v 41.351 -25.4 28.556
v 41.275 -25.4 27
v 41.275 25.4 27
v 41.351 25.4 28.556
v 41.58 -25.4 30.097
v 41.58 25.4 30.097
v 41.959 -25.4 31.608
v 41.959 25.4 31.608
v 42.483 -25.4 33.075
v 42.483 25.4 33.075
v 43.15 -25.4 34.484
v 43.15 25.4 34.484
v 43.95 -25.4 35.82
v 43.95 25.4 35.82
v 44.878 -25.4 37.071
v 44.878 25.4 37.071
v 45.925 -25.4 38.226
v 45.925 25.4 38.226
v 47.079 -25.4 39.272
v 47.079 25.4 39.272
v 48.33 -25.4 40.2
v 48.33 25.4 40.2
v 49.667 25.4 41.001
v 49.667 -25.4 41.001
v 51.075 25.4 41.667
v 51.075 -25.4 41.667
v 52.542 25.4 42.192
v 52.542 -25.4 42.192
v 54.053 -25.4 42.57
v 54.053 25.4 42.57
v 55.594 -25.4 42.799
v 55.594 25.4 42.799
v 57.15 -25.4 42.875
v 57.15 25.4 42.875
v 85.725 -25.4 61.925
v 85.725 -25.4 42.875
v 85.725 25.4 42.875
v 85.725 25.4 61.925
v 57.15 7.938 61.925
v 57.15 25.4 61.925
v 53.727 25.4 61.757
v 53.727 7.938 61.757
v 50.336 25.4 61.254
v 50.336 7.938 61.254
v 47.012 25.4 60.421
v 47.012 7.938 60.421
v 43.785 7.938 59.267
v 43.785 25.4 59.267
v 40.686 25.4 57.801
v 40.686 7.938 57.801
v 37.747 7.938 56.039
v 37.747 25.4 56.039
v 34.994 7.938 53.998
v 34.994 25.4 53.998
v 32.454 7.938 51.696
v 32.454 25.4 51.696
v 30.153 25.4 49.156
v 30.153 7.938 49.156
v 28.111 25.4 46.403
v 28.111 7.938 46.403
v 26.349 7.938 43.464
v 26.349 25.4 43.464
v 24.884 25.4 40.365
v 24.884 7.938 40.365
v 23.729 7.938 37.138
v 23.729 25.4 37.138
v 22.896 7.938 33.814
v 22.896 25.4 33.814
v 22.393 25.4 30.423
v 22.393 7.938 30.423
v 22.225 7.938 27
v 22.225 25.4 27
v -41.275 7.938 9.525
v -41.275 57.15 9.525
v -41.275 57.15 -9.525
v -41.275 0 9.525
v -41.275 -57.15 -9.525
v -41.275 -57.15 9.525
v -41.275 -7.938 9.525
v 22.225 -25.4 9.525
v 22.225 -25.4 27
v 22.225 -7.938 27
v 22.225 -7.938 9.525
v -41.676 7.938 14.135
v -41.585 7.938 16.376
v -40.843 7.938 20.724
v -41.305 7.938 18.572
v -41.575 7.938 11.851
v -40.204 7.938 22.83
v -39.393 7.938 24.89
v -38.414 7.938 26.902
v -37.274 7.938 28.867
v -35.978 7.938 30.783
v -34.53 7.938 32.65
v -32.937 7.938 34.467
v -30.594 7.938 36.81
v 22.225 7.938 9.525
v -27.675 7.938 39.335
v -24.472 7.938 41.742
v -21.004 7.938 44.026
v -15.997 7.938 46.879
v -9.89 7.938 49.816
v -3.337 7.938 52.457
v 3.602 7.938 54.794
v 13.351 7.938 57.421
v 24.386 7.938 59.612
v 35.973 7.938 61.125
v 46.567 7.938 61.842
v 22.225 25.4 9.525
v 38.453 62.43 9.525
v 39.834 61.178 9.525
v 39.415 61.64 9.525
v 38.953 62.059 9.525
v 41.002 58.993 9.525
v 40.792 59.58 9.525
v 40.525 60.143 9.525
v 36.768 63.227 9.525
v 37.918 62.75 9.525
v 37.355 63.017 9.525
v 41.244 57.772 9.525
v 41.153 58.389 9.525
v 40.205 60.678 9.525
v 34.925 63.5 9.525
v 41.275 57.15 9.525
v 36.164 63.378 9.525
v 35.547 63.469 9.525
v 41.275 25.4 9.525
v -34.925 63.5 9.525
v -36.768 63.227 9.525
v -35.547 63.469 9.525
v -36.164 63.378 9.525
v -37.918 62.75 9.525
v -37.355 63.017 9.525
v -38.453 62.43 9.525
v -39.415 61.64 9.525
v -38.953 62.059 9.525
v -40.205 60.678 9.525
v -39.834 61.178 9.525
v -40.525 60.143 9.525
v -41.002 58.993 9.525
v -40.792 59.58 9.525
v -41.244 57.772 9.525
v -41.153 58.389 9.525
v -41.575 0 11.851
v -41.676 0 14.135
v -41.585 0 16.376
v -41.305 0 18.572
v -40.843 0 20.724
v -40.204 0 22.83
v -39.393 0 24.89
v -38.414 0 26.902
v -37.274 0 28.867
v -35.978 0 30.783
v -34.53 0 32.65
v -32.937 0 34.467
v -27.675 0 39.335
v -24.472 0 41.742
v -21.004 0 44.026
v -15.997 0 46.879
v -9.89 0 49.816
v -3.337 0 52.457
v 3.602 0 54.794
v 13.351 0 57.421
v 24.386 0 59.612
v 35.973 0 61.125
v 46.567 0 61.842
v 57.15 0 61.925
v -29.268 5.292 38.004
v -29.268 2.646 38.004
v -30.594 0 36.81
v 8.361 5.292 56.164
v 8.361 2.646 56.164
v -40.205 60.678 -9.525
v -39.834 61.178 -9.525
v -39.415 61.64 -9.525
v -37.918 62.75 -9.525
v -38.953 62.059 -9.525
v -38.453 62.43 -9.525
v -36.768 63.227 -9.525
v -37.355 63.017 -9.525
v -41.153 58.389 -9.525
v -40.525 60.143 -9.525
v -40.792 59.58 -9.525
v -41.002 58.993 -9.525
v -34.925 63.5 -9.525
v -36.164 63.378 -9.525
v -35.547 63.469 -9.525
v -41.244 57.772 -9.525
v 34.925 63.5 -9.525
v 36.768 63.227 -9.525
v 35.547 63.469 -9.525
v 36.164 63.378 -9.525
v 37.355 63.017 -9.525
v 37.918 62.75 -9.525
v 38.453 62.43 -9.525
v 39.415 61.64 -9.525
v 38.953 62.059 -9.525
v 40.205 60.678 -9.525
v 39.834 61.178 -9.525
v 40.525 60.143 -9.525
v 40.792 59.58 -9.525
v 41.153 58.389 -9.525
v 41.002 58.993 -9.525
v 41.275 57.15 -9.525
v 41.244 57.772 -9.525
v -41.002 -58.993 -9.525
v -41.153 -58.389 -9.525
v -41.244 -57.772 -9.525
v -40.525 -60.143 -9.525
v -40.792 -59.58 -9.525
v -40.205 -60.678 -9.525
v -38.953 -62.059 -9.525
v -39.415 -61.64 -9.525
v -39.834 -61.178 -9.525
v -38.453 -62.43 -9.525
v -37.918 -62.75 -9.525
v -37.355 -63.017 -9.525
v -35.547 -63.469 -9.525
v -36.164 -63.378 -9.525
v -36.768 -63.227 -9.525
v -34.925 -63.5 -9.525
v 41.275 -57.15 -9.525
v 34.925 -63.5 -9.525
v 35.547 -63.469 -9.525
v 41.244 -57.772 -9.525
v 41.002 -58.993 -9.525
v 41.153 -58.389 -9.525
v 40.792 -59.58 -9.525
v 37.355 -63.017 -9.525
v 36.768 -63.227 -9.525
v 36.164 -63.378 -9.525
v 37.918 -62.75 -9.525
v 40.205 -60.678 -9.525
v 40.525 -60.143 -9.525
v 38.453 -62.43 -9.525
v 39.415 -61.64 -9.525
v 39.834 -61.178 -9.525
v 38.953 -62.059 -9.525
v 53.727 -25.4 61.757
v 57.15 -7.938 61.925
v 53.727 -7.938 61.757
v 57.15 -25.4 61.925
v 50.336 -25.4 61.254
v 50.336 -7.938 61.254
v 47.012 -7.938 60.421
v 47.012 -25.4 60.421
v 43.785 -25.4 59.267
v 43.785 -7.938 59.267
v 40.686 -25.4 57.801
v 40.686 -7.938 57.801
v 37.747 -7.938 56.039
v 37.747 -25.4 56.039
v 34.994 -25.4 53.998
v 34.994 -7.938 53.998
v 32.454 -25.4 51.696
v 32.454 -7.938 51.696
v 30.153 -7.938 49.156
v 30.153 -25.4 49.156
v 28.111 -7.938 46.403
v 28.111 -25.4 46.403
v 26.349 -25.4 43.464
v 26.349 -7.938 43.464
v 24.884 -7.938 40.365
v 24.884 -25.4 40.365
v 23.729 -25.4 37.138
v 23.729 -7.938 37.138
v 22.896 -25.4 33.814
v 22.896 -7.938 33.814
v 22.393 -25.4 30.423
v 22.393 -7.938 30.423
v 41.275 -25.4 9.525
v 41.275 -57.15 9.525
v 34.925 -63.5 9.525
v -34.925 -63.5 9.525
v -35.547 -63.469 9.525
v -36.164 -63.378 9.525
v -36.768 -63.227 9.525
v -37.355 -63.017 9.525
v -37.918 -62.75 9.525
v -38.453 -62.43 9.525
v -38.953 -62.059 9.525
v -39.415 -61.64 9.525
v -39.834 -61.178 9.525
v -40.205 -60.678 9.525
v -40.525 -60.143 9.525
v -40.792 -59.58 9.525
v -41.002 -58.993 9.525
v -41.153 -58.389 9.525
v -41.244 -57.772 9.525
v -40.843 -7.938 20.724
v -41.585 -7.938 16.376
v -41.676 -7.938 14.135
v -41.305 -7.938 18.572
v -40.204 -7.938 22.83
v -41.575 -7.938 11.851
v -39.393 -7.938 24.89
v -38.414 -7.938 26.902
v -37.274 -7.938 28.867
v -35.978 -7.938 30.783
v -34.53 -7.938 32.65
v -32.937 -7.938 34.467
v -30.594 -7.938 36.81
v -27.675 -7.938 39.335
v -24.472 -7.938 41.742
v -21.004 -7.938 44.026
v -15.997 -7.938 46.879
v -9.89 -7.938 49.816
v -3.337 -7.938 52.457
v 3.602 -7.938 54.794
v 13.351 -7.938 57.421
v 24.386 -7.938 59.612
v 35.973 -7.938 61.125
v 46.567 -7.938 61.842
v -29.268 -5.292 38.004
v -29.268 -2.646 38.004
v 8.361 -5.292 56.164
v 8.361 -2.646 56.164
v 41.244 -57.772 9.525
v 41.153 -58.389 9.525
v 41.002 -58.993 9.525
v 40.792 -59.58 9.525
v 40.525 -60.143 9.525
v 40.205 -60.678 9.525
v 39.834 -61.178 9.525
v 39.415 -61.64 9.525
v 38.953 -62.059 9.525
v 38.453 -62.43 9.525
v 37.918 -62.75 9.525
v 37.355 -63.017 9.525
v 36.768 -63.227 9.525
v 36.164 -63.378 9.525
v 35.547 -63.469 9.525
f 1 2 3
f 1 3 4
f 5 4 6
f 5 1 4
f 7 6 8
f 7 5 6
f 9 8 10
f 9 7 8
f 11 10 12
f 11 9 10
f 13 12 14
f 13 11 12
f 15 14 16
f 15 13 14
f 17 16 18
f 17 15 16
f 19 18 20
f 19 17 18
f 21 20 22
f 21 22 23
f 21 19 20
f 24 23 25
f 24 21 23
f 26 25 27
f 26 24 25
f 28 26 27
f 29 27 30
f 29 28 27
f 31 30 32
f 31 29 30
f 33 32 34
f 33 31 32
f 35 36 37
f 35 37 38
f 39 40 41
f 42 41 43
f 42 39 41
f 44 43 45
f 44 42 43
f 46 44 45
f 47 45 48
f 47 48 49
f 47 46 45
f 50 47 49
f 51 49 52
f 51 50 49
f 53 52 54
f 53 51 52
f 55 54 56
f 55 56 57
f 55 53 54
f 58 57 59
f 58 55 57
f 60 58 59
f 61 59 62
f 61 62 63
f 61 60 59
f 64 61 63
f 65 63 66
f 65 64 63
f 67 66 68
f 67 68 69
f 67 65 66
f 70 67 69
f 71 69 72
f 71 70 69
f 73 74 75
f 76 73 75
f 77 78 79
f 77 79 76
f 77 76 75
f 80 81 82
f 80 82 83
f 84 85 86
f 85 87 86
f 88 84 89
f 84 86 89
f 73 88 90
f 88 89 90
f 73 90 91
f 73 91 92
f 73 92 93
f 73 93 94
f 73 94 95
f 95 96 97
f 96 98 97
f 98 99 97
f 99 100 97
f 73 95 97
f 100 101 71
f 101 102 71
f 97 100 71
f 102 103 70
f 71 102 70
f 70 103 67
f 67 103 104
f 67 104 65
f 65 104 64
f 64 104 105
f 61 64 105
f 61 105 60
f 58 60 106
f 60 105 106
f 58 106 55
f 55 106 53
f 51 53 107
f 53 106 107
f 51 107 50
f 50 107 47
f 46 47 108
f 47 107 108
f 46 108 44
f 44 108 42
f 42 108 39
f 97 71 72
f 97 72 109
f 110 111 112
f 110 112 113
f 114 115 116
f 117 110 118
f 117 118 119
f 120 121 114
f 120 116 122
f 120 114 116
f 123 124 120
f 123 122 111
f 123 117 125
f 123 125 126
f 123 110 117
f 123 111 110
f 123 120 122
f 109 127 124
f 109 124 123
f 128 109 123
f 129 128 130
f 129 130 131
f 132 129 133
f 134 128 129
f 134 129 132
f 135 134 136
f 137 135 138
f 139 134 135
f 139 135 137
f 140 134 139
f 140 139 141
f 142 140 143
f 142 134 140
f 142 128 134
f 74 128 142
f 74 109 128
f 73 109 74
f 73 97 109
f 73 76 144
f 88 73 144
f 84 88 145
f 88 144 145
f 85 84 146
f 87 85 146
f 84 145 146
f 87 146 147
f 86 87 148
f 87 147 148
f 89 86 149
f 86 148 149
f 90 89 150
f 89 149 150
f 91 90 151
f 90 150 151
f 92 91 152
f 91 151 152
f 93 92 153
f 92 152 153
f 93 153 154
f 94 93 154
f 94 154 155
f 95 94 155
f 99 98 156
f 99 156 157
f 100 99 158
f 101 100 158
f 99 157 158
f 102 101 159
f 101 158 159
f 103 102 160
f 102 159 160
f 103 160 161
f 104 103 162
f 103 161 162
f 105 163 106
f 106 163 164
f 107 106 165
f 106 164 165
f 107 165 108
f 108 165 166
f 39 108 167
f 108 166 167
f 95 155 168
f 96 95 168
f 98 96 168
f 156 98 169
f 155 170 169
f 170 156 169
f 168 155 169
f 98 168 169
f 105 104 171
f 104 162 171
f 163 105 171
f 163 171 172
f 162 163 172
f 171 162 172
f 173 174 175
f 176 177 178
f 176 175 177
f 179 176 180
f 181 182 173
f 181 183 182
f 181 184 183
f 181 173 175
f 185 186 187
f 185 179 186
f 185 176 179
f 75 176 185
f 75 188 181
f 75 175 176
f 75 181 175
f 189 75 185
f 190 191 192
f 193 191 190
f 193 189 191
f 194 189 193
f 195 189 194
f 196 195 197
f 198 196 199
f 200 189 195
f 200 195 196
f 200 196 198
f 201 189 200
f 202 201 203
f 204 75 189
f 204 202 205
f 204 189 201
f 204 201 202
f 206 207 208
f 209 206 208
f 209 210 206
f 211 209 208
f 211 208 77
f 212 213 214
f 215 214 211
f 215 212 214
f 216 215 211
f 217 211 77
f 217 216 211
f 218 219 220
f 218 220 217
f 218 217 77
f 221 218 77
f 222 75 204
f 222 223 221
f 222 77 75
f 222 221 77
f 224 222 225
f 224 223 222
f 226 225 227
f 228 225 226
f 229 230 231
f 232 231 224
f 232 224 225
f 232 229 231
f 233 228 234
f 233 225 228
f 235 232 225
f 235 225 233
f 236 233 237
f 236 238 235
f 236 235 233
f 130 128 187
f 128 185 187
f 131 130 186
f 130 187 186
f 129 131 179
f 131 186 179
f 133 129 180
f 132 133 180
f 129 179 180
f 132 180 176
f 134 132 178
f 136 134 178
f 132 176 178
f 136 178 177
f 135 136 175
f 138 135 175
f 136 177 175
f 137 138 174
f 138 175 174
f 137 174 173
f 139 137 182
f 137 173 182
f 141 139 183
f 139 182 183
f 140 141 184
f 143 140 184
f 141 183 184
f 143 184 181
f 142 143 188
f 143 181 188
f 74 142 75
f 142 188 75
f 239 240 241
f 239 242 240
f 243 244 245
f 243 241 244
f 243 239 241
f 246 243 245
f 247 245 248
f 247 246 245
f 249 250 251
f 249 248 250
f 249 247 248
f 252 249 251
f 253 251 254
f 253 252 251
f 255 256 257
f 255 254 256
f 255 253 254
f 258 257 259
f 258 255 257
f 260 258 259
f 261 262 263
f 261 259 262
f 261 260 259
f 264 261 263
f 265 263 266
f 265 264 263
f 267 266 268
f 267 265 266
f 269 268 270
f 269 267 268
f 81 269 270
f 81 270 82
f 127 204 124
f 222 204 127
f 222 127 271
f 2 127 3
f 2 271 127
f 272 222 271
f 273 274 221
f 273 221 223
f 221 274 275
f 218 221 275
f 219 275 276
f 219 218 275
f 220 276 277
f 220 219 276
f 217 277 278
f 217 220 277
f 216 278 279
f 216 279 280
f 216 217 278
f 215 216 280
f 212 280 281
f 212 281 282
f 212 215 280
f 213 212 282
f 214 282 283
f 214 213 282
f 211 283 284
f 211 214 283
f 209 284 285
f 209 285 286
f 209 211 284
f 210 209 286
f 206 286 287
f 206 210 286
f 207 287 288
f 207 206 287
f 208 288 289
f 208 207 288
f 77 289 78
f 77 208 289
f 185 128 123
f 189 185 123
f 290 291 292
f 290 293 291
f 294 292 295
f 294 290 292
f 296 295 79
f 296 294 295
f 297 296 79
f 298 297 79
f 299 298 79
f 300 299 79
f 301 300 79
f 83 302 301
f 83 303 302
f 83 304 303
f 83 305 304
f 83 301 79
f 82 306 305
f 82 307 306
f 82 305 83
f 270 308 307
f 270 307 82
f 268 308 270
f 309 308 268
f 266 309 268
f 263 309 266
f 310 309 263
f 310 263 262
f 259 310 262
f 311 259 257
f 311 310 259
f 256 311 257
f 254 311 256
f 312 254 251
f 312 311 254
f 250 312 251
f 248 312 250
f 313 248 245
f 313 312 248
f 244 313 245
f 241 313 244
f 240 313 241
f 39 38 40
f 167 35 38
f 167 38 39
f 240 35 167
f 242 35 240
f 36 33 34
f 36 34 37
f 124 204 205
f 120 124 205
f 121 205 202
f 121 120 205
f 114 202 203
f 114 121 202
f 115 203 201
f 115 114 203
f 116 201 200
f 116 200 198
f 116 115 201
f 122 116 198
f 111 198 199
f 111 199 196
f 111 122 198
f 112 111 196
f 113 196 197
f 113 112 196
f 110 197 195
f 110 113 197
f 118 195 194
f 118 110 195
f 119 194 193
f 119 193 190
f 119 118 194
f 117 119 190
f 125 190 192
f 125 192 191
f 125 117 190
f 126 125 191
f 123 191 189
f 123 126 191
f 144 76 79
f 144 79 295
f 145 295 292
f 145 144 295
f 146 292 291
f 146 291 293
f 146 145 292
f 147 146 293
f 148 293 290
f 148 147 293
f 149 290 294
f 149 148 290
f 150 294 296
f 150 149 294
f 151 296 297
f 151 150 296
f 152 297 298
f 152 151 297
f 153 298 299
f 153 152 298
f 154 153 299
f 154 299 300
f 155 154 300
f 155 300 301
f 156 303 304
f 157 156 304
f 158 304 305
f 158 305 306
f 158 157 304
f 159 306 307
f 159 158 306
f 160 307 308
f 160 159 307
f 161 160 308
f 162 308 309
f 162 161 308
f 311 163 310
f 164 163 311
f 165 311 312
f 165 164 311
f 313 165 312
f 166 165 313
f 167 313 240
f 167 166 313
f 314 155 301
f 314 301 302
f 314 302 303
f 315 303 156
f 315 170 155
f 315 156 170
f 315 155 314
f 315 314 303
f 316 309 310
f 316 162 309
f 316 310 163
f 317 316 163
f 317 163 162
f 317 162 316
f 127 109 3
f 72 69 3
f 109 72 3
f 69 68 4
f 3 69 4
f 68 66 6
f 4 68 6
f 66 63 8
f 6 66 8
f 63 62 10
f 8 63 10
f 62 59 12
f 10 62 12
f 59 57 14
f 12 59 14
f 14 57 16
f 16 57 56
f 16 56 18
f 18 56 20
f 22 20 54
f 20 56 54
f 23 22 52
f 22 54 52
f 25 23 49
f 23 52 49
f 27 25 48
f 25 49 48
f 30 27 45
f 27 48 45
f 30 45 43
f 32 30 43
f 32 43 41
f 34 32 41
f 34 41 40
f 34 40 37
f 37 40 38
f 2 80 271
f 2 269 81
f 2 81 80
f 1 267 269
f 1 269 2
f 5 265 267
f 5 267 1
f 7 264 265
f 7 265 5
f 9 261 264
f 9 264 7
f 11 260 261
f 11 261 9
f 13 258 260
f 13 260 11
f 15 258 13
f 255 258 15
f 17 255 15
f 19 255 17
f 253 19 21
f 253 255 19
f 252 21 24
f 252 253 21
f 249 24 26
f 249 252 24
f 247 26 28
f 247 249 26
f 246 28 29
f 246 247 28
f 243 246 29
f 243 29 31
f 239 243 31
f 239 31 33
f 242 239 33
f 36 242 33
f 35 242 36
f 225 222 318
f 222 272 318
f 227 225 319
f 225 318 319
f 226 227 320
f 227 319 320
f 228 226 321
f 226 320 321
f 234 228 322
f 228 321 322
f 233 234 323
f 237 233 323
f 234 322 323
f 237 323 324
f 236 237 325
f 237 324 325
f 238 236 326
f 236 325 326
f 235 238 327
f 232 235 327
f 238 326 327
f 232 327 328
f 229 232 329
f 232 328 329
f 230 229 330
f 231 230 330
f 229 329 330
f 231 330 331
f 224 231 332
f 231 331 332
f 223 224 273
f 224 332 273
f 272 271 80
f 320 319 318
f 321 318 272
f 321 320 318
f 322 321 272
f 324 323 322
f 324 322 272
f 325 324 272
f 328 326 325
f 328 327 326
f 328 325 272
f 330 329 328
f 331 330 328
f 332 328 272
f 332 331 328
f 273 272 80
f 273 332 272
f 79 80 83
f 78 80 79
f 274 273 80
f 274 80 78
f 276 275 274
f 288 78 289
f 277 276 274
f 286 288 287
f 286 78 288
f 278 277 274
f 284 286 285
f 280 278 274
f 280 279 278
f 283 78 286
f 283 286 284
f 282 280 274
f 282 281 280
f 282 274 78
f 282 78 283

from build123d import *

# Parameters (mm, degrees)
F1_DEPTH = 63.5
F0_W     = 25.4
F0_H     = 19.05
F2_DEPTH = 25.4
F3_DEPTH = 7.9375
F4_R     = 6.35


with BuildPart() as f1:
    # F0 (on Front) → F1 (new body, symmetric)
    with BuildSketch(Plane.XZ):
        Polygon((41.275, -9.525), (41.275, 9.525), (22.225, 9.525), (-41.275, 9.525), (-41.275, -9.525), align=None)
    extrude(amount=F1_DEPTH, both=True)

    # F0 (on Front) → F2 (join, symmetric)
    with BuildSketch(Plane.XZ):
        with BuildLine():
            Line((22.225, 9.525), (41.275, 9.525))
            Line((41.275, 9.525), (41.275, 27.0002))
            ThreePointArc((41.275, 27.0002), (45.92468, 38.22552), (57.15, 42.8752))
            Line((57.15, 42.8752), (60.325, 42.8752))
            Line((60.325, 42.8752), (60.325, 61.9252))
            Line((60.325, 61.9252), (57.15, 61.9252))
            ThreePointArc((57.15, 61.9252), (32.454296, 51.695904), (22.225, 27.0002))
            Line((22.225, 27.0002), (22.225, 9.525))
        make_face()
        with Locations((73.025, 52.4002)):
            Rectangle(F0_W, F0_H)
    extrude(amount=F2_DEPTH, both=True)

    # F0 (on Front) → F3 (join, symmetric)
    with BuildSketch(Plane.XZ):
        with BuildLine():
            Line((-41.275, 9.525), (22.225, 9.525))
            Line((22.225, 9.525), (22.225, 27.0002))
            ThreePointArc((22.225, 27.0002), (32.454296, 51.695904), (57.15, 61.9252))
            add(Edge.make_bspline(
                [(-41.275, 9.525), (-46.898041, 42.469062), (7.599939, 63.057207), (57.15, 61.9252)],
                knots=[0, 0, 0, 0, 111.504536, 111.504536, 111.504536, 111.504536], degree=3))
        make_face()
    extrude(amount=F3_DEPTH, both=True)

    # F4
    f4_edges = [f1.edges().sort_by_distance(p)[0] for p in [
        (41.275, -63.5, 0),
        (-41.275, -63.5, 0),
        (41.275, 63.5, 0),
        (-41.275, 63.5, 0),
    ]]
    fillet(f4_edges, radius=F4_R)


solid = f1.part
